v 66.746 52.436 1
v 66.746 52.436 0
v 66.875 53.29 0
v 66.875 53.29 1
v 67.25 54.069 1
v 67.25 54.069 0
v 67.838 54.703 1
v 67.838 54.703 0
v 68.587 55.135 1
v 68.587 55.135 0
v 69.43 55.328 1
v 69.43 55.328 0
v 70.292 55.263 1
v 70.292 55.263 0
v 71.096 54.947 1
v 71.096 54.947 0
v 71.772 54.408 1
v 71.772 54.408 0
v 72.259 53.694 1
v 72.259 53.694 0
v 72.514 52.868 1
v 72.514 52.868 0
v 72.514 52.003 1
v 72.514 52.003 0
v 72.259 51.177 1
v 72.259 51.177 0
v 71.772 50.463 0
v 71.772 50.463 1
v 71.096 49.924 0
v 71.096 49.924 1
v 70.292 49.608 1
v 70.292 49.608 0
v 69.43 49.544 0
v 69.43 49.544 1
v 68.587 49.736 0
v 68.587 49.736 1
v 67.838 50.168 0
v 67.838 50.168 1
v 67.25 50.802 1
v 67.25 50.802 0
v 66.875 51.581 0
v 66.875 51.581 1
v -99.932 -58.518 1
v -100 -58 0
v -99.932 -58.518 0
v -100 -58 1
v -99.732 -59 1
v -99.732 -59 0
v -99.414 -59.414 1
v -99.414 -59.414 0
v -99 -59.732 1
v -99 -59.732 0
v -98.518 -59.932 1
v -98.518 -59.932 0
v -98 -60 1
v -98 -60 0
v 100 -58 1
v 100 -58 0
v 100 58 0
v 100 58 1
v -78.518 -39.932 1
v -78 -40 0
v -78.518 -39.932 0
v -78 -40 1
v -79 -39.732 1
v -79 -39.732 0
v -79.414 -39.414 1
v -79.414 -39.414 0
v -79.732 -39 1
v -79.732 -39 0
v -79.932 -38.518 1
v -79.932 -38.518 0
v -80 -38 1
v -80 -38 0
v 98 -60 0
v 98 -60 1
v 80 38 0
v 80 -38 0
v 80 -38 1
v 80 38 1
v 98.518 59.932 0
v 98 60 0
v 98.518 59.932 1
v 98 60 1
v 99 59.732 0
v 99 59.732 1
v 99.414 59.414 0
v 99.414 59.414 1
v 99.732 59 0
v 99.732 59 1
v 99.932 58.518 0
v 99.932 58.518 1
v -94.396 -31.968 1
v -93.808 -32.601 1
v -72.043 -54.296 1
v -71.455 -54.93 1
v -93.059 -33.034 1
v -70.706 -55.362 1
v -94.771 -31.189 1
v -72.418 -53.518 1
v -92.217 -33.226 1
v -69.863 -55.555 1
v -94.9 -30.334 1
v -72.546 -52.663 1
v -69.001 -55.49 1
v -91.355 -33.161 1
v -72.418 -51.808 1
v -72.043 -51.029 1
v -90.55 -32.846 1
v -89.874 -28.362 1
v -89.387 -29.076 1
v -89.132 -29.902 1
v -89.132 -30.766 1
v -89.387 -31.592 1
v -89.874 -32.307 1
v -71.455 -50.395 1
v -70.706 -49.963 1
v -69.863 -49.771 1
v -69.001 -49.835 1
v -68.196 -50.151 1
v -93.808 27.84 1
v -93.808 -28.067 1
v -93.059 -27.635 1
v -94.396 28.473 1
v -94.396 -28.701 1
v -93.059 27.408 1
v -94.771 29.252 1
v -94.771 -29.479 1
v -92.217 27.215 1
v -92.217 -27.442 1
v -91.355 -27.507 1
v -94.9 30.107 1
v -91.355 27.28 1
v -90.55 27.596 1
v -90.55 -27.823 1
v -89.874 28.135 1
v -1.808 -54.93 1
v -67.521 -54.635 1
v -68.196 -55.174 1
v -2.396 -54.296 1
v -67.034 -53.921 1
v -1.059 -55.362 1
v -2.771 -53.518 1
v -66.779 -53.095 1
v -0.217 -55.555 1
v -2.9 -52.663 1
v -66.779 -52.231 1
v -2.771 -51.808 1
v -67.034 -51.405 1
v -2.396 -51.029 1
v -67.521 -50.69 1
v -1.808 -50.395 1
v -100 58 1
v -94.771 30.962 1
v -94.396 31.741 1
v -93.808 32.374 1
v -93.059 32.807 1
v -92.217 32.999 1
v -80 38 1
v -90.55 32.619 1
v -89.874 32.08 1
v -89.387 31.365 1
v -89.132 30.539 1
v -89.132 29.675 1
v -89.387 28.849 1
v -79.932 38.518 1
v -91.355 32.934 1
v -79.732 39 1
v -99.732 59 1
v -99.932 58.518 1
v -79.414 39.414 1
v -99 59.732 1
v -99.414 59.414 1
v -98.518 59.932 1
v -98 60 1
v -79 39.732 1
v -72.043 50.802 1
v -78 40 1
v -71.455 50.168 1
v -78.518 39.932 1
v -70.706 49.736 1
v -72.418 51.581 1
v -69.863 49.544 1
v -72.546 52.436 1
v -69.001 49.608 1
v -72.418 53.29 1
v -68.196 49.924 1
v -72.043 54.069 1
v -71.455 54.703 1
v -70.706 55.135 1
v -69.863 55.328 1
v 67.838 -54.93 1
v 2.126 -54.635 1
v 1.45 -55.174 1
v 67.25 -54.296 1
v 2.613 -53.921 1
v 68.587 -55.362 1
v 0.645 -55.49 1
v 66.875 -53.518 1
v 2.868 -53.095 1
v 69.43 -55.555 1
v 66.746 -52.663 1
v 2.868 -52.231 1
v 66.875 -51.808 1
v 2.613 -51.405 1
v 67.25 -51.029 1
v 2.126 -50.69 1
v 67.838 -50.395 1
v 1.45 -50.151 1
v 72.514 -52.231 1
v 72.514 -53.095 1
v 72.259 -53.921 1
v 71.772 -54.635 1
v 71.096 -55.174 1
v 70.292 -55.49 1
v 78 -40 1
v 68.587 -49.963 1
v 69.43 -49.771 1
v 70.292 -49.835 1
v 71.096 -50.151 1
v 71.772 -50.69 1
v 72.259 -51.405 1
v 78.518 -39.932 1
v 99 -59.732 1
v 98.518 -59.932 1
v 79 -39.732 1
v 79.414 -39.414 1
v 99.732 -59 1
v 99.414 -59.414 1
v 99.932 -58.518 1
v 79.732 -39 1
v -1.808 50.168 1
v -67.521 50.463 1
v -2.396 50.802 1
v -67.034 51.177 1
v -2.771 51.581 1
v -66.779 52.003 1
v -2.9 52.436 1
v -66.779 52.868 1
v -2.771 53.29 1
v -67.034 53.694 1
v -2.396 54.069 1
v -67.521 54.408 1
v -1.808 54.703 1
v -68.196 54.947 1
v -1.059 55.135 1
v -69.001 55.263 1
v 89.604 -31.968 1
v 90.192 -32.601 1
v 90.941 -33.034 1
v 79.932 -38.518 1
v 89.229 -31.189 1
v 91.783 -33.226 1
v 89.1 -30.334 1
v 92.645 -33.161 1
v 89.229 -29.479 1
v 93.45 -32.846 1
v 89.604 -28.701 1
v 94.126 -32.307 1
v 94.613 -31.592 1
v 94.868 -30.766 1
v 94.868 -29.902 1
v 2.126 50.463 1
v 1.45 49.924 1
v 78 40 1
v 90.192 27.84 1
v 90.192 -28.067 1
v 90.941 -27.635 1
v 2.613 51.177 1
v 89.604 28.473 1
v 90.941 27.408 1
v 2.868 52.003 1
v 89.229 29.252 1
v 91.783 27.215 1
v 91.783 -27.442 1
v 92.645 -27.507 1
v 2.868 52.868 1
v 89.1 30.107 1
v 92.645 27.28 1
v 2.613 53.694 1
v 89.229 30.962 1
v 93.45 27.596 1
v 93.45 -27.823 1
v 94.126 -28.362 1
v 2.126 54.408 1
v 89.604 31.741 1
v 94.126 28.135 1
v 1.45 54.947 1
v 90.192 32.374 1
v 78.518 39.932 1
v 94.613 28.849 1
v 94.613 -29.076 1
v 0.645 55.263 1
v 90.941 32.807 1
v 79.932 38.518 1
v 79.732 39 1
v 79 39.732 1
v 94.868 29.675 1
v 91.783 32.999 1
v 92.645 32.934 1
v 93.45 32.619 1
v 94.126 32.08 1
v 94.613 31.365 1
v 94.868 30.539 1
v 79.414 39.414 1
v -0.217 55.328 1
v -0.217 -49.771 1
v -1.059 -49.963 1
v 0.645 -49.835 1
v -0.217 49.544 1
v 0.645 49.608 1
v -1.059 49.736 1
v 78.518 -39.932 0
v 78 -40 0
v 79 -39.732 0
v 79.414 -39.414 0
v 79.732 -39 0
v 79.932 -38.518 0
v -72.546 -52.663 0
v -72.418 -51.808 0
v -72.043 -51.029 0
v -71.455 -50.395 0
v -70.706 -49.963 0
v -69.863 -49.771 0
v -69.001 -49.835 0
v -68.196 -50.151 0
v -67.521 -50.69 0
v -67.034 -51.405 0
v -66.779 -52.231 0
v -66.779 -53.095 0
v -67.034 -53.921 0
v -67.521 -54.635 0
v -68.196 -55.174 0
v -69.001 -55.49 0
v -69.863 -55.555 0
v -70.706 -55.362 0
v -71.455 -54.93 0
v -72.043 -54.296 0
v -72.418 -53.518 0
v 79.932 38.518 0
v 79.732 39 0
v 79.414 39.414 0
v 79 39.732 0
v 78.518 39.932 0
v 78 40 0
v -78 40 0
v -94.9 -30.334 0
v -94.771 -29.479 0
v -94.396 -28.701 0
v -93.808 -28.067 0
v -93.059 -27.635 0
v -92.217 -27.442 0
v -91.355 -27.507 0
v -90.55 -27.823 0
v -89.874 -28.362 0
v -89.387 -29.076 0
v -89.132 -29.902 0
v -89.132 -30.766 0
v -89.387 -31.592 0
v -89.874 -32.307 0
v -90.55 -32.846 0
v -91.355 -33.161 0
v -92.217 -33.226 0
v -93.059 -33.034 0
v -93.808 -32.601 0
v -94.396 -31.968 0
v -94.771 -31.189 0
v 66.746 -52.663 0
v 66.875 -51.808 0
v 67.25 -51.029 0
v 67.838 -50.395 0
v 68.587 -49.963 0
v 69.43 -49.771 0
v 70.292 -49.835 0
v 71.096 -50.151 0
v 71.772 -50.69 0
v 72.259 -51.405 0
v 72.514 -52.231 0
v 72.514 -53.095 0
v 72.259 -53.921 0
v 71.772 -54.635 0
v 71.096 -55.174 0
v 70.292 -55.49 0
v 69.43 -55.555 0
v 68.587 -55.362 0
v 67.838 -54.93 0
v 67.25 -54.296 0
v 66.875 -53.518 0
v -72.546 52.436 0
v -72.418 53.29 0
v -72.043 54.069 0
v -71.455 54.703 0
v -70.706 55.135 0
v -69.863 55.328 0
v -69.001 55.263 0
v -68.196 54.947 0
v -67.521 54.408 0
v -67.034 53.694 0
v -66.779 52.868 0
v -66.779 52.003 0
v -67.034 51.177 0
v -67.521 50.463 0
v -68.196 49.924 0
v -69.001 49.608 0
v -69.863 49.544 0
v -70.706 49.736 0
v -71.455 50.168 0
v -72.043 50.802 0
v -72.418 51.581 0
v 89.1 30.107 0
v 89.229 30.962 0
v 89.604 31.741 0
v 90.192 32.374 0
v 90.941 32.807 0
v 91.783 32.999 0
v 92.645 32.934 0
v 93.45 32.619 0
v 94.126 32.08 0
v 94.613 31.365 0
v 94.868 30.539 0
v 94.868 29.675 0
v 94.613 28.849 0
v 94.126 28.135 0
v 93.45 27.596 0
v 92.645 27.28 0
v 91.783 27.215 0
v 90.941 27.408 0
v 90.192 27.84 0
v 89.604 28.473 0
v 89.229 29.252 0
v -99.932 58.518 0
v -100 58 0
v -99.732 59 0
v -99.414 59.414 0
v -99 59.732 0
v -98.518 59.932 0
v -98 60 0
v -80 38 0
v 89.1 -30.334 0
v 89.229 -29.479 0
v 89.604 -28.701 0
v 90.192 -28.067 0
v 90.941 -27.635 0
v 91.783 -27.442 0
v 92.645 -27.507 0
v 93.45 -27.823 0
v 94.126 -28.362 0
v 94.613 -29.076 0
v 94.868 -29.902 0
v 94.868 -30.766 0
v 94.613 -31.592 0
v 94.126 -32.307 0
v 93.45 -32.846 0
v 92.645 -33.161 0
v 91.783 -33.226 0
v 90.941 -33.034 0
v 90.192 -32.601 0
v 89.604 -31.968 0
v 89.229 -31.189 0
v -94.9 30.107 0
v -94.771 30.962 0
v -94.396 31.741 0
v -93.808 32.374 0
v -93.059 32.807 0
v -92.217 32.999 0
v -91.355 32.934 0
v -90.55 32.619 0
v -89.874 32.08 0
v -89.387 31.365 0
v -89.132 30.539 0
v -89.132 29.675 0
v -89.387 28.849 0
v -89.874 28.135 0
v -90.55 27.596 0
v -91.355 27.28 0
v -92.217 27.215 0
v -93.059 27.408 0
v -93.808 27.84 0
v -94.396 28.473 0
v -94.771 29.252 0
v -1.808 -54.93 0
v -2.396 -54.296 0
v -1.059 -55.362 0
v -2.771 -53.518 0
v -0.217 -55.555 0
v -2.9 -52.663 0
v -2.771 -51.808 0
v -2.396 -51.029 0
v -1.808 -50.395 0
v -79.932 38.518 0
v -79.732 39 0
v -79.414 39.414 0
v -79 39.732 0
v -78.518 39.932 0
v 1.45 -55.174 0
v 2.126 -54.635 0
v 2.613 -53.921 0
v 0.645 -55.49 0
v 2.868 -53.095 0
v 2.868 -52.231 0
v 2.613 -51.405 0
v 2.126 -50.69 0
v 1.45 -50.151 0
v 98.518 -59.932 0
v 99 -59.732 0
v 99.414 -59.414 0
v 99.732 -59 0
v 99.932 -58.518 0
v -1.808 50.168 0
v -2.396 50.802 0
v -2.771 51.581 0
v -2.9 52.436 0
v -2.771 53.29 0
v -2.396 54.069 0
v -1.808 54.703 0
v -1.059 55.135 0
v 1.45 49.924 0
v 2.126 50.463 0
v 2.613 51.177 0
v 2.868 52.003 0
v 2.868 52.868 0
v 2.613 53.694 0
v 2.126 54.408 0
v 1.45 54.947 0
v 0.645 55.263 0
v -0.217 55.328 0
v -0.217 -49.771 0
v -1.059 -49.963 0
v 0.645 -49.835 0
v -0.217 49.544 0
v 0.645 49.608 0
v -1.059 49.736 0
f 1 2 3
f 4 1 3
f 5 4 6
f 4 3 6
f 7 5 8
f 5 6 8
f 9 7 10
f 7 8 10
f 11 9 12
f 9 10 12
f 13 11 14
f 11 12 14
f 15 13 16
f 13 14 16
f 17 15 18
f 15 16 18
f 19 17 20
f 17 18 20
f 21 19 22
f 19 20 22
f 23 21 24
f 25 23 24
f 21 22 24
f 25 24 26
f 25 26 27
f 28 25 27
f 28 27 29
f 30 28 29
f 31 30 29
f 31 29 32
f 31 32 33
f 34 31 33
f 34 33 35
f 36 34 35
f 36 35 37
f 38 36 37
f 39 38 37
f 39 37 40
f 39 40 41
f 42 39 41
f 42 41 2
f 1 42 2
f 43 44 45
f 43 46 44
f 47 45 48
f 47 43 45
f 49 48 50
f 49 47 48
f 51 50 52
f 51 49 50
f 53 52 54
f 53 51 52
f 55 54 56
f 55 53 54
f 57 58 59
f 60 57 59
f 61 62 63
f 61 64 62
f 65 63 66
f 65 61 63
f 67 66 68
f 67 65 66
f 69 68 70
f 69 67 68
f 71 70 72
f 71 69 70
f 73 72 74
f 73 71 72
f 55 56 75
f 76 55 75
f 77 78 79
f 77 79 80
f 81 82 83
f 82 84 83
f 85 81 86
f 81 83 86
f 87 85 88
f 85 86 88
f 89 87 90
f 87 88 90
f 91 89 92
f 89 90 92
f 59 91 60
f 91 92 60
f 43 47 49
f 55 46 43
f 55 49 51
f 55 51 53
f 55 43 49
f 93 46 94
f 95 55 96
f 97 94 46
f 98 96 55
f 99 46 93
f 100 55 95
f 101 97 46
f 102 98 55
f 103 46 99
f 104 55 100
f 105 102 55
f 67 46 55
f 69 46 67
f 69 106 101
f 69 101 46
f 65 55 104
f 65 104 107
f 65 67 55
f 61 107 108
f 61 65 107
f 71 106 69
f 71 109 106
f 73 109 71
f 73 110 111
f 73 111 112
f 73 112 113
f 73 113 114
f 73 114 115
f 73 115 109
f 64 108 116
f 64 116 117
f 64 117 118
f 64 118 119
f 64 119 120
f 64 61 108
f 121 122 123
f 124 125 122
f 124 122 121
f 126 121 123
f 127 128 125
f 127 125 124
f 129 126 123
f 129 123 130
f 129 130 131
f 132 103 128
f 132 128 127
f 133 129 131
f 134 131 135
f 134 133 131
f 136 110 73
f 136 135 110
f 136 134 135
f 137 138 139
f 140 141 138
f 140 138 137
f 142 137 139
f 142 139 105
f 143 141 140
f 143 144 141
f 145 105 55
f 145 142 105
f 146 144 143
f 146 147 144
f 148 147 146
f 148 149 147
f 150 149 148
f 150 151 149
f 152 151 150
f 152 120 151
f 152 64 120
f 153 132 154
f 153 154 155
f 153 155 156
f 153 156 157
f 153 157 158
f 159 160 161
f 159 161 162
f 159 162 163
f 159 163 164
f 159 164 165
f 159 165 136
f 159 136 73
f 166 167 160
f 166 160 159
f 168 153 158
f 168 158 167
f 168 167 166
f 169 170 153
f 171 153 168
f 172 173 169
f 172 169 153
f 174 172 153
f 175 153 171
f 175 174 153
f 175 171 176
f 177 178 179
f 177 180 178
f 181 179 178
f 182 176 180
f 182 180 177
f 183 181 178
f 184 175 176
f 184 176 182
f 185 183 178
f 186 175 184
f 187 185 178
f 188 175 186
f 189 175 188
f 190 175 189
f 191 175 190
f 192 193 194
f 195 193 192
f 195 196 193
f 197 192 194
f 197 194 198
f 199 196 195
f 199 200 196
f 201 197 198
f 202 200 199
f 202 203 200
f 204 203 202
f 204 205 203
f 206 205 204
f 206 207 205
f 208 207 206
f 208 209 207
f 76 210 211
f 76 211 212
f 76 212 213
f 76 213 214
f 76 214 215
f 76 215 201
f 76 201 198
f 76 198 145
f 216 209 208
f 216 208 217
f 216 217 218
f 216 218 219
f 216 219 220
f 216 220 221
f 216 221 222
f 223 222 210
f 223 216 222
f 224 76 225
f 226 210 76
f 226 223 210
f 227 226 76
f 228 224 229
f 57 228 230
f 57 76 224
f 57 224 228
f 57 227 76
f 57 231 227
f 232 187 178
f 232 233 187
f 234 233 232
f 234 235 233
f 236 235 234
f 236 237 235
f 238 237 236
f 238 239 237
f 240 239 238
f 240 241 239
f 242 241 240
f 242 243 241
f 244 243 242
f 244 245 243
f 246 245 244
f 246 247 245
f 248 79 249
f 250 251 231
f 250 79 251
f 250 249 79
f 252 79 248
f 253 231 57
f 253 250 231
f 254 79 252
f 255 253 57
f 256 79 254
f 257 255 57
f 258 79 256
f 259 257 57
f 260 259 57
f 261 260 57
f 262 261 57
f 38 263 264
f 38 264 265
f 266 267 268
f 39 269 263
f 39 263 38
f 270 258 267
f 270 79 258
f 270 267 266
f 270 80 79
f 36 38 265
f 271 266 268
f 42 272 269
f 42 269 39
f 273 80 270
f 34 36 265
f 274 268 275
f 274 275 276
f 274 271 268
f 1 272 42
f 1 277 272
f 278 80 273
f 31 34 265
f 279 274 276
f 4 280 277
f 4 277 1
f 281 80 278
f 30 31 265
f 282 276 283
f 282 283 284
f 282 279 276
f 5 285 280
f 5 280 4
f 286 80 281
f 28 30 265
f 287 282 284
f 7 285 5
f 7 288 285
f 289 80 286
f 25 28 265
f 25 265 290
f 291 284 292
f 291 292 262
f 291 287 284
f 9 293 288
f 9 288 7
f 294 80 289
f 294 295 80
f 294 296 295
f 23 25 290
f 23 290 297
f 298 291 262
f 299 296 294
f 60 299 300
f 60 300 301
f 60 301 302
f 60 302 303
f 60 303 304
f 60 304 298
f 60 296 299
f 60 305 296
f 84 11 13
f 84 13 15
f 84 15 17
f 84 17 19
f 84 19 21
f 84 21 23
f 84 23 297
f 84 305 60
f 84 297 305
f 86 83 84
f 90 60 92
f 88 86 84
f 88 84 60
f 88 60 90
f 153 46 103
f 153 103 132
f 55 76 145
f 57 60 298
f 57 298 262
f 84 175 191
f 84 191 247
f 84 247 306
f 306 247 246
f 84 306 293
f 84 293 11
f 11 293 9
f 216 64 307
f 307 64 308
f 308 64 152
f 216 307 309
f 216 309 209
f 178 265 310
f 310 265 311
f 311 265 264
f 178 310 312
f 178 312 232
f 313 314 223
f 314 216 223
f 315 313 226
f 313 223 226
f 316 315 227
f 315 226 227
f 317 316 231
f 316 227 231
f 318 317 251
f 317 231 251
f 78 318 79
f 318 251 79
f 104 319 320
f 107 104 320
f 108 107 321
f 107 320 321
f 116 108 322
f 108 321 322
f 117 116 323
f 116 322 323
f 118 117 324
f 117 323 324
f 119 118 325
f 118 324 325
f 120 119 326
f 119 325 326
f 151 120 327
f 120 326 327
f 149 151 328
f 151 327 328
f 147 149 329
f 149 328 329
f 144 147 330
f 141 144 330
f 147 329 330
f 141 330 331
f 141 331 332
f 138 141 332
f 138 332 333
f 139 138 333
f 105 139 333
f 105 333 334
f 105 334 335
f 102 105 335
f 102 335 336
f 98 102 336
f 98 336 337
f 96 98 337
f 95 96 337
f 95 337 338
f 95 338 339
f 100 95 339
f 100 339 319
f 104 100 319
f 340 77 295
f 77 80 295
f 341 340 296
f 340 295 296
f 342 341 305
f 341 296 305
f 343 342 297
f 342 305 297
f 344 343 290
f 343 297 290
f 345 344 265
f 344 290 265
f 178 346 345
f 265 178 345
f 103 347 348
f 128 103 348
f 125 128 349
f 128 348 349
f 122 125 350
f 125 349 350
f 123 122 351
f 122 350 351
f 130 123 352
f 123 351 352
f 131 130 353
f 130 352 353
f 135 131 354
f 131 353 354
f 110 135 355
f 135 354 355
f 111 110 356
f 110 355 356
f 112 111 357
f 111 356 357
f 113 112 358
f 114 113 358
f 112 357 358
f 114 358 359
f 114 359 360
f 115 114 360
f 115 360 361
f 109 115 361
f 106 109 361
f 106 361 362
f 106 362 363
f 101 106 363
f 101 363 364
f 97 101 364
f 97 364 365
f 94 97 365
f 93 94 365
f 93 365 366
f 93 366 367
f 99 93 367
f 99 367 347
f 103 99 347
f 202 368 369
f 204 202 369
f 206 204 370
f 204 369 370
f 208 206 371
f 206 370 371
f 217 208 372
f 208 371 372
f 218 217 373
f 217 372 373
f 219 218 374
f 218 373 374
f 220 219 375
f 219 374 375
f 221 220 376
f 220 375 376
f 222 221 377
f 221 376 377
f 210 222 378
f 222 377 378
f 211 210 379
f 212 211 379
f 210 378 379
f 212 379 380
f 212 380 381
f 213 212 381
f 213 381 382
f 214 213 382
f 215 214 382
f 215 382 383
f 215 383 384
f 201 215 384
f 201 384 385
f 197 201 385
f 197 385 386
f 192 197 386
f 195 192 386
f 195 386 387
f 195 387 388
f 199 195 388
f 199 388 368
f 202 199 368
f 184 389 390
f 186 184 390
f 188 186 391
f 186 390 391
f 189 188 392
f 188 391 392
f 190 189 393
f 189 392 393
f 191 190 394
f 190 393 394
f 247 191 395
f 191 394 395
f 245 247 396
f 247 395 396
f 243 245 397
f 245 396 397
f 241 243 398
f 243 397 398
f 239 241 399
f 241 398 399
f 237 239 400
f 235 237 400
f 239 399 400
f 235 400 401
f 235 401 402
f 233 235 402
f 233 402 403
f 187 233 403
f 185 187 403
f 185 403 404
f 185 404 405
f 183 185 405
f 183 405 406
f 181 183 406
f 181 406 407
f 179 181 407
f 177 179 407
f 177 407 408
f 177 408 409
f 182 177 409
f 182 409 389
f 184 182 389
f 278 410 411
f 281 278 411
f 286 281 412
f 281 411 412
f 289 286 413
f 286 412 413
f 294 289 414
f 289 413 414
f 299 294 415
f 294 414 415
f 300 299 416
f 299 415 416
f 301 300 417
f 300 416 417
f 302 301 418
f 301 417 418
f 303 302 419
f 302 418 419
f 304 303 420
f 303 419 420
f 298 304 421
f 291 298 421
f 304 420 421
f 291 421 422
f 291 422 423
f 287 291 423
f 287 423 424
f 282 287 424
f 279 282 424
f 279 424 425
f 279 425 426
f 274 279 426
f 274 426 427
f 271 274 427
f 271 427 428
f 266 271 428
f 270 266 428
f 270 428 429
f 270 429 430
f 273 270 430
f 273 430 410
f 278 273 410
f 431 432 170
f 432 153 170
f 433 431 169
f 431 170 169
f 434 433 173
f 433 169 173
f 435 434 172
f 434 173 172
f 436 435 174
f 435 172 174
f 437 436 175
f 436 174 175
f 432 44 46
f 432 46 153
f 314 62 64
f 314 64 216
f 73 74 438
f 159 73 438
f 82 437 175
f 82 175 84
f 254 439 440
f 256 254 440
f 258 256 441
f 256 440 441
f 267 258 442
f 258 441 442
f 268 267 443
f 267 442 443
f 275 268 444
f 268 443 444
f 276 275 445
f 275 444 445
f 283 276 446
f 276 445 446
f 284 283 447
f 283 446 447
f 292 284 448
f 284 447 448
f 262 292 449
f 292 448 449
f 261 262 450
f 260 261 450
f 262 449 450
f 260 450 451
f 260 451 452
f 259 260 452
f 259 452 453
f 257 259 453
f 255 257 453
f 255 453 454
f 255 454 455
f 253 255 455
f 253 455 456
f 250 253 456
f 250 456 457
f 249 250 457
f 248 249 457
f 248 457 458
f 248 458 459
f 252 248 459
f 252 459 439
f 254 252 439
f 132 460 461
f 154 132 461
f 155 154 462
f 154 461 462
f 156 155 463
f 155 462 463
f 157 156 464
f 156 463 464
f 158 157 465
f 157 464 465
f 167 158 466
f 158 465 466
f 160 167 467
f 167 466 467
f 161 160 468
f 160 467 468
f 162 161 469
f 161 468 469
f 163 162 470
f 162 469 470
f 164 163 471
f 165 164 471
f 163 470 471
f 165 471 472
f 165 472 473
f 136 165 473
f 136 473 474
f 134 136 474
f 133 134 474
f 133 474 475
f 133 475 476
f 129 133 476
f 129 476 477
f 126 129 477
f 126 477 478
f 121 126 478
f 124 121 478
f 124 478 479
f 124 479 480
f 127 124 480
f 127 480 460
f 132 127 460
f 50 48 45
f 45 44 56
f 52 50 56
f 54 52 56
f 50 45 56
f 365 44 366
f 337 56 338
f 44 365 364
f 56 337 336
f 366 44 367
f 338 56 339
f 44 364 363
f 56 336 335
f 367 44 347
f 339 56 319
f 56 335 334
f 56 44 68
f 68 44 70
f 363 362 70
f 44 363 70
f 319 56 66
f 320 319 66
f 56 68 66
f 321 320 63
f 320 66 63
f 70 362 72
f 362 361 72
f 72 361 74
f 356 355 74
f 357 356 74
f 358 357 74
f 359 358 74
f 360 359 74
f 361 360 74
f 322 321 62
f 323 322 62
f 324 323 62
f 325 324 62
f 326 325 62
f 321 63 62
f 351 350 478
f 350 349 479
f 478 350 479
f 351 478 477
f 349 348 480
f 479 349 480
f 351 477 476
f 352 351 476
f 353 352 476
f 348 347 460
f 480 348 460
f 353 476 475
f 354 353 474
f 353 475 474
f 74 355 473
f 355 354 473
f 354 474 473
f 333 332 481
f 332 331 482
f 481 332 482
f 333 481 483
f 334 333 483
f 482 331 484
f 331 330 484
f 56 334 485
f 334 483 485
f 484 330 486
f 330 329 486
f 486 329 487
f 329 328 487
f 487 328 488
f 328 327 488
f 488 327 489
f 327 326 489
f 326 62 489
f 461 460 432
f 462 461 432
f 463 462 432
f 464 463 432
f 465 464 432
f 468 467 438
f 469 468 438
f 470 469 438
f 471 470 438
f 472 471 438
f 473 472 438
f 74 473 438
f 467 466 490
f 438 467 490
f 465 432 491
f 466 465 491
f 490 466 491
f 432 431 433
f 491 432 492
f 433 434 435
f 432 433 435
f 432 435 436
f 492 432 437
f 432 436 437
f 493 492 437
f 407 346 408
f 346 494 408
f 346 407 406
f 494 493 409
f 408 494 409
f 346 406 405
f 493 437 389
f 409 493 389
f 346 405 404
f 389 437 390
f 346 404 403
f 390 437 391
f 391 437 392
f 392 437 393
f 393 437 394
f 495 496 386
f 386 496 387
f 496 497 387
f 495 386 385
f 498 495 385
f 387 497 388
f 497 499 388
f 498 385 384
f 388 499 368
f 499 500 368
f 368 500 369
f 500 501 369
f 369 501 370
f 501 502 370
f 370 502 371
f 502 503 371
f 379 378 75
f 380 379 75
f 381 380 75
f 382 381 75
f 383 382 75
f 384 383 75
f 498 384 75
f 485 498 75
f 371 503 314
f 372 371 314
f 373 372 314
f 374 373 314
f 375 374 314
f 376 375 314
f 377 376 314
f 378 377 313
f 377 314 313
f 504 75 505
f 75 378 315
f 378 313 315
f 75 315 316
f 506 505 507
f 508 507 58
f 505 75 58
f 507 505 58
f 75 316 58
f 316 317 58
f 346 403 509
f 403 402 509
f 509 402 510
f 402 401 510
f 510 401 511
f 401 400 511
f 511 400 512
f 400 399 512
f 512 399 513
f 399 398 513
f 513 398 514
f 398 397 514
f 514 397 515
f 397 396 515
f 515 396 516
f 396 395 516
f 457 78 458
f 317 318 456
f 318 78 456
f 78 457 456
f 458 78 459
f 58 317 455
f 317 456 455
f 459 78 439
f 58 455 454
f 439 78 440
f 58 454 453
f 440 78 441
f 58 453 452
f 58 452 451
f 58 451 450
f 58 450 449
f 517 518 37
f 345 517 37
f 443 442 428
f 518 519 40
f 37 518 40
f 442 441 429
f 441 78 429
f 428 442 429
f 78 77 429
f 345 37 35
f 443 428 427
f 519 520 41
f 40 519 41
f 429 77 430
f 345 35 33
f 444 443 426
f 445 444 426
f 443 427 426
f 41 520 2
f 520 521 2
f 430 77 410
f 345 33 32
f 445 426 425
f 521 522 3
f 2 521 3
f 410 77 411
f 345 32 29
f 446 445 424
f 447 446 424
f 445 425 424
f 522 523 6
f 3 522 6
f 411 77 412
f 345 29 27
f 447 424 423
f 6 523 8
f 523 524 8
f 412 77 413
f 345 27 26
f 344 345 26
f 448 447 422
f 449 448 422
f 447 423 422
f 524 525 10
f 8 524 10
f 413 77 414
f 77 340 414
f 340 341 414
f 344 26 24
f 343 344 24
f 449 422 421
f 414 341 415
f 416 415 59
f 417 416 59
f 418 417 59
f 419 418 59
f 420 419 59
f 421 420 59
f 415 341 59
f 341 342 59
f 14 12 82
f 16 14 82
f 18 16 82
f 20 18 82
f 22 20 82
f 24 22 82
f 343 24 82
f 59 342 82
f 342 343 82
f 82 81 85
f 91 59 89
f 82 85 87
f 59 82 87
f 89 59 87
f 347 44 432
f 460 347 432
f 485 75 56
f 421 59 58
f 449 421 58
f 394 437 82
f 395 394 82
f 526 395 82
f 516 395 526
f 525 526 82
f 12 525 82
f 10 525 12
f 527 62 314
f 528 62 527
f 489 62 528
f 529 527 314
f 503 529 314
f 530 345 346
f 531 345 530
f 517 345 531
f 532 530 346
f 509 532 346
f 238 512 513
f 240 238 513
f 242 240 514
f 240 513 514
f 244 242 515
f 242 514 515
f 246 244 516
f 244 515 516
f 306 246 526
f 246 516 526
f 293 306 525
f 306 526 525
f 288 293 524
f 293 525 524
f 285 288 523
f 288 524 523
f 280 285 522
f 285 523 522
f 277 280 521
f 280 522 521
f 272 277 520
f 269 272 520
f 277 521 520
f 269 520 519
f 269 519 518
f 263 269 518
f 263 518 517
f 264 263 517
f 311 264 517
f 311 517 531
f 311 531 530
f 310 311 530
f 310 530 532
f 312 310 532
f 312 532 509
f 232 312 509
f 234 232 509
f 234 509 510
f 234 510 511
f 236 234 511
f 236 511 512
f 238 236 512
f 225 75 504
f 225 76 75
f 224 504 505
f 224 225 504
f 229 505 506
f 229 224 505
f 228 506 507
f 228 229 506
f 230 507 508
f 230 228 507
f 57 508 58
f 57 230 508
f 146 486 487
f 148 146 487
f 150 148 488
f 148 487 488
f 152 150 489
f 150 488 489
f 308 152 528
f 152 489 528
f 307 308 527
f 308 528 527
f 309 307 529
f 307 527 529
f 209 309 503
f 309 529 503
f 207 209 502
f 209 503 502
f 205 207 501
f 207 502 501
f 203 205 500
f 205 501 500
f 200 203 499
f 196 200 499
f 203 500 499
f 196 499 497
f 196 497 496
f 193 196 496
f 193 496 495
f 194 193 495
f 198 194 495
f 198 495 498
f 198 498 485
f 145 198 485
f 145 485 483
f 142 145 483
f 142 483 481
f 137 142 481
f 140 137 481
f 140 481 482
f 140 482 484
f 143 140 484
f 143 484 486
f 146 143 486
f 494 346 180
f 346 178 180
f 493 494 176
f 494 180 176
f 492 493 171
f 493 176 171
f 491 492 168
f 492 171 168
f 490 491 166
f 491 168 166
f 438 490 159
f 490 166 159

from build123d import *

# Parameters (mm, degrees)
SKETCH1_W            = 200
SKETCH1_H            = 120
SKETCH1_W_2          = 160
SKETCH1_H_2          = 80
BOSS_EXTRUDE1_DEPTH  = 1
FILLET1_R            = 2
M5_CLEARANCE_HOLE1_D = 5.8


with BuildPart() as part:
    # Sketch1 → Boss-Extrude1 (new body)
    with BuildSketch(Plane.XY):
        Rectangle(SKETCH1_W, SKETCH1_H)
        Rectangle(SKETCH1_W_2, SKETCH1_H_2, mode=Mode.SUBTRACT)
    extrude(amount=BOSS_EXTRUDE1_DEPTH)

    # Fillet1
    fillet1_edges = [part.edges().sort_by_distance(p)[0] for p in [
        (-80, 40, 0.5),
        (-80, -40, 0.5),
        (80, -40, 0.5),
        (80, 40, 0.5),
        (-100, 60, 0.5),
        (100, 60, 0.5),
        (100, -60, 0.5),
        (-100, -60, 0.5),
    ]]
    fillet(fillet1_edges, radius=FILLET1_R)

    # M5 Clearance Hole1 (through all)
    with Locations(Plane.XY.offset(1)):
        with Locations((92, -30.334149623), (69.646446609, -52.66277265), (92, 30.107073019), (0, -52.66277265), (69.646446609, 52.435696047), (0, 52.435696047), (-69.646446609, 52.435696047), (-92, 30.107073019), (-92, -30.334149623), (-69.646446609, -52.66277265)):
            Hole(M5_CLEARANCE_HOLE1_D / 2)


solid = part.part
